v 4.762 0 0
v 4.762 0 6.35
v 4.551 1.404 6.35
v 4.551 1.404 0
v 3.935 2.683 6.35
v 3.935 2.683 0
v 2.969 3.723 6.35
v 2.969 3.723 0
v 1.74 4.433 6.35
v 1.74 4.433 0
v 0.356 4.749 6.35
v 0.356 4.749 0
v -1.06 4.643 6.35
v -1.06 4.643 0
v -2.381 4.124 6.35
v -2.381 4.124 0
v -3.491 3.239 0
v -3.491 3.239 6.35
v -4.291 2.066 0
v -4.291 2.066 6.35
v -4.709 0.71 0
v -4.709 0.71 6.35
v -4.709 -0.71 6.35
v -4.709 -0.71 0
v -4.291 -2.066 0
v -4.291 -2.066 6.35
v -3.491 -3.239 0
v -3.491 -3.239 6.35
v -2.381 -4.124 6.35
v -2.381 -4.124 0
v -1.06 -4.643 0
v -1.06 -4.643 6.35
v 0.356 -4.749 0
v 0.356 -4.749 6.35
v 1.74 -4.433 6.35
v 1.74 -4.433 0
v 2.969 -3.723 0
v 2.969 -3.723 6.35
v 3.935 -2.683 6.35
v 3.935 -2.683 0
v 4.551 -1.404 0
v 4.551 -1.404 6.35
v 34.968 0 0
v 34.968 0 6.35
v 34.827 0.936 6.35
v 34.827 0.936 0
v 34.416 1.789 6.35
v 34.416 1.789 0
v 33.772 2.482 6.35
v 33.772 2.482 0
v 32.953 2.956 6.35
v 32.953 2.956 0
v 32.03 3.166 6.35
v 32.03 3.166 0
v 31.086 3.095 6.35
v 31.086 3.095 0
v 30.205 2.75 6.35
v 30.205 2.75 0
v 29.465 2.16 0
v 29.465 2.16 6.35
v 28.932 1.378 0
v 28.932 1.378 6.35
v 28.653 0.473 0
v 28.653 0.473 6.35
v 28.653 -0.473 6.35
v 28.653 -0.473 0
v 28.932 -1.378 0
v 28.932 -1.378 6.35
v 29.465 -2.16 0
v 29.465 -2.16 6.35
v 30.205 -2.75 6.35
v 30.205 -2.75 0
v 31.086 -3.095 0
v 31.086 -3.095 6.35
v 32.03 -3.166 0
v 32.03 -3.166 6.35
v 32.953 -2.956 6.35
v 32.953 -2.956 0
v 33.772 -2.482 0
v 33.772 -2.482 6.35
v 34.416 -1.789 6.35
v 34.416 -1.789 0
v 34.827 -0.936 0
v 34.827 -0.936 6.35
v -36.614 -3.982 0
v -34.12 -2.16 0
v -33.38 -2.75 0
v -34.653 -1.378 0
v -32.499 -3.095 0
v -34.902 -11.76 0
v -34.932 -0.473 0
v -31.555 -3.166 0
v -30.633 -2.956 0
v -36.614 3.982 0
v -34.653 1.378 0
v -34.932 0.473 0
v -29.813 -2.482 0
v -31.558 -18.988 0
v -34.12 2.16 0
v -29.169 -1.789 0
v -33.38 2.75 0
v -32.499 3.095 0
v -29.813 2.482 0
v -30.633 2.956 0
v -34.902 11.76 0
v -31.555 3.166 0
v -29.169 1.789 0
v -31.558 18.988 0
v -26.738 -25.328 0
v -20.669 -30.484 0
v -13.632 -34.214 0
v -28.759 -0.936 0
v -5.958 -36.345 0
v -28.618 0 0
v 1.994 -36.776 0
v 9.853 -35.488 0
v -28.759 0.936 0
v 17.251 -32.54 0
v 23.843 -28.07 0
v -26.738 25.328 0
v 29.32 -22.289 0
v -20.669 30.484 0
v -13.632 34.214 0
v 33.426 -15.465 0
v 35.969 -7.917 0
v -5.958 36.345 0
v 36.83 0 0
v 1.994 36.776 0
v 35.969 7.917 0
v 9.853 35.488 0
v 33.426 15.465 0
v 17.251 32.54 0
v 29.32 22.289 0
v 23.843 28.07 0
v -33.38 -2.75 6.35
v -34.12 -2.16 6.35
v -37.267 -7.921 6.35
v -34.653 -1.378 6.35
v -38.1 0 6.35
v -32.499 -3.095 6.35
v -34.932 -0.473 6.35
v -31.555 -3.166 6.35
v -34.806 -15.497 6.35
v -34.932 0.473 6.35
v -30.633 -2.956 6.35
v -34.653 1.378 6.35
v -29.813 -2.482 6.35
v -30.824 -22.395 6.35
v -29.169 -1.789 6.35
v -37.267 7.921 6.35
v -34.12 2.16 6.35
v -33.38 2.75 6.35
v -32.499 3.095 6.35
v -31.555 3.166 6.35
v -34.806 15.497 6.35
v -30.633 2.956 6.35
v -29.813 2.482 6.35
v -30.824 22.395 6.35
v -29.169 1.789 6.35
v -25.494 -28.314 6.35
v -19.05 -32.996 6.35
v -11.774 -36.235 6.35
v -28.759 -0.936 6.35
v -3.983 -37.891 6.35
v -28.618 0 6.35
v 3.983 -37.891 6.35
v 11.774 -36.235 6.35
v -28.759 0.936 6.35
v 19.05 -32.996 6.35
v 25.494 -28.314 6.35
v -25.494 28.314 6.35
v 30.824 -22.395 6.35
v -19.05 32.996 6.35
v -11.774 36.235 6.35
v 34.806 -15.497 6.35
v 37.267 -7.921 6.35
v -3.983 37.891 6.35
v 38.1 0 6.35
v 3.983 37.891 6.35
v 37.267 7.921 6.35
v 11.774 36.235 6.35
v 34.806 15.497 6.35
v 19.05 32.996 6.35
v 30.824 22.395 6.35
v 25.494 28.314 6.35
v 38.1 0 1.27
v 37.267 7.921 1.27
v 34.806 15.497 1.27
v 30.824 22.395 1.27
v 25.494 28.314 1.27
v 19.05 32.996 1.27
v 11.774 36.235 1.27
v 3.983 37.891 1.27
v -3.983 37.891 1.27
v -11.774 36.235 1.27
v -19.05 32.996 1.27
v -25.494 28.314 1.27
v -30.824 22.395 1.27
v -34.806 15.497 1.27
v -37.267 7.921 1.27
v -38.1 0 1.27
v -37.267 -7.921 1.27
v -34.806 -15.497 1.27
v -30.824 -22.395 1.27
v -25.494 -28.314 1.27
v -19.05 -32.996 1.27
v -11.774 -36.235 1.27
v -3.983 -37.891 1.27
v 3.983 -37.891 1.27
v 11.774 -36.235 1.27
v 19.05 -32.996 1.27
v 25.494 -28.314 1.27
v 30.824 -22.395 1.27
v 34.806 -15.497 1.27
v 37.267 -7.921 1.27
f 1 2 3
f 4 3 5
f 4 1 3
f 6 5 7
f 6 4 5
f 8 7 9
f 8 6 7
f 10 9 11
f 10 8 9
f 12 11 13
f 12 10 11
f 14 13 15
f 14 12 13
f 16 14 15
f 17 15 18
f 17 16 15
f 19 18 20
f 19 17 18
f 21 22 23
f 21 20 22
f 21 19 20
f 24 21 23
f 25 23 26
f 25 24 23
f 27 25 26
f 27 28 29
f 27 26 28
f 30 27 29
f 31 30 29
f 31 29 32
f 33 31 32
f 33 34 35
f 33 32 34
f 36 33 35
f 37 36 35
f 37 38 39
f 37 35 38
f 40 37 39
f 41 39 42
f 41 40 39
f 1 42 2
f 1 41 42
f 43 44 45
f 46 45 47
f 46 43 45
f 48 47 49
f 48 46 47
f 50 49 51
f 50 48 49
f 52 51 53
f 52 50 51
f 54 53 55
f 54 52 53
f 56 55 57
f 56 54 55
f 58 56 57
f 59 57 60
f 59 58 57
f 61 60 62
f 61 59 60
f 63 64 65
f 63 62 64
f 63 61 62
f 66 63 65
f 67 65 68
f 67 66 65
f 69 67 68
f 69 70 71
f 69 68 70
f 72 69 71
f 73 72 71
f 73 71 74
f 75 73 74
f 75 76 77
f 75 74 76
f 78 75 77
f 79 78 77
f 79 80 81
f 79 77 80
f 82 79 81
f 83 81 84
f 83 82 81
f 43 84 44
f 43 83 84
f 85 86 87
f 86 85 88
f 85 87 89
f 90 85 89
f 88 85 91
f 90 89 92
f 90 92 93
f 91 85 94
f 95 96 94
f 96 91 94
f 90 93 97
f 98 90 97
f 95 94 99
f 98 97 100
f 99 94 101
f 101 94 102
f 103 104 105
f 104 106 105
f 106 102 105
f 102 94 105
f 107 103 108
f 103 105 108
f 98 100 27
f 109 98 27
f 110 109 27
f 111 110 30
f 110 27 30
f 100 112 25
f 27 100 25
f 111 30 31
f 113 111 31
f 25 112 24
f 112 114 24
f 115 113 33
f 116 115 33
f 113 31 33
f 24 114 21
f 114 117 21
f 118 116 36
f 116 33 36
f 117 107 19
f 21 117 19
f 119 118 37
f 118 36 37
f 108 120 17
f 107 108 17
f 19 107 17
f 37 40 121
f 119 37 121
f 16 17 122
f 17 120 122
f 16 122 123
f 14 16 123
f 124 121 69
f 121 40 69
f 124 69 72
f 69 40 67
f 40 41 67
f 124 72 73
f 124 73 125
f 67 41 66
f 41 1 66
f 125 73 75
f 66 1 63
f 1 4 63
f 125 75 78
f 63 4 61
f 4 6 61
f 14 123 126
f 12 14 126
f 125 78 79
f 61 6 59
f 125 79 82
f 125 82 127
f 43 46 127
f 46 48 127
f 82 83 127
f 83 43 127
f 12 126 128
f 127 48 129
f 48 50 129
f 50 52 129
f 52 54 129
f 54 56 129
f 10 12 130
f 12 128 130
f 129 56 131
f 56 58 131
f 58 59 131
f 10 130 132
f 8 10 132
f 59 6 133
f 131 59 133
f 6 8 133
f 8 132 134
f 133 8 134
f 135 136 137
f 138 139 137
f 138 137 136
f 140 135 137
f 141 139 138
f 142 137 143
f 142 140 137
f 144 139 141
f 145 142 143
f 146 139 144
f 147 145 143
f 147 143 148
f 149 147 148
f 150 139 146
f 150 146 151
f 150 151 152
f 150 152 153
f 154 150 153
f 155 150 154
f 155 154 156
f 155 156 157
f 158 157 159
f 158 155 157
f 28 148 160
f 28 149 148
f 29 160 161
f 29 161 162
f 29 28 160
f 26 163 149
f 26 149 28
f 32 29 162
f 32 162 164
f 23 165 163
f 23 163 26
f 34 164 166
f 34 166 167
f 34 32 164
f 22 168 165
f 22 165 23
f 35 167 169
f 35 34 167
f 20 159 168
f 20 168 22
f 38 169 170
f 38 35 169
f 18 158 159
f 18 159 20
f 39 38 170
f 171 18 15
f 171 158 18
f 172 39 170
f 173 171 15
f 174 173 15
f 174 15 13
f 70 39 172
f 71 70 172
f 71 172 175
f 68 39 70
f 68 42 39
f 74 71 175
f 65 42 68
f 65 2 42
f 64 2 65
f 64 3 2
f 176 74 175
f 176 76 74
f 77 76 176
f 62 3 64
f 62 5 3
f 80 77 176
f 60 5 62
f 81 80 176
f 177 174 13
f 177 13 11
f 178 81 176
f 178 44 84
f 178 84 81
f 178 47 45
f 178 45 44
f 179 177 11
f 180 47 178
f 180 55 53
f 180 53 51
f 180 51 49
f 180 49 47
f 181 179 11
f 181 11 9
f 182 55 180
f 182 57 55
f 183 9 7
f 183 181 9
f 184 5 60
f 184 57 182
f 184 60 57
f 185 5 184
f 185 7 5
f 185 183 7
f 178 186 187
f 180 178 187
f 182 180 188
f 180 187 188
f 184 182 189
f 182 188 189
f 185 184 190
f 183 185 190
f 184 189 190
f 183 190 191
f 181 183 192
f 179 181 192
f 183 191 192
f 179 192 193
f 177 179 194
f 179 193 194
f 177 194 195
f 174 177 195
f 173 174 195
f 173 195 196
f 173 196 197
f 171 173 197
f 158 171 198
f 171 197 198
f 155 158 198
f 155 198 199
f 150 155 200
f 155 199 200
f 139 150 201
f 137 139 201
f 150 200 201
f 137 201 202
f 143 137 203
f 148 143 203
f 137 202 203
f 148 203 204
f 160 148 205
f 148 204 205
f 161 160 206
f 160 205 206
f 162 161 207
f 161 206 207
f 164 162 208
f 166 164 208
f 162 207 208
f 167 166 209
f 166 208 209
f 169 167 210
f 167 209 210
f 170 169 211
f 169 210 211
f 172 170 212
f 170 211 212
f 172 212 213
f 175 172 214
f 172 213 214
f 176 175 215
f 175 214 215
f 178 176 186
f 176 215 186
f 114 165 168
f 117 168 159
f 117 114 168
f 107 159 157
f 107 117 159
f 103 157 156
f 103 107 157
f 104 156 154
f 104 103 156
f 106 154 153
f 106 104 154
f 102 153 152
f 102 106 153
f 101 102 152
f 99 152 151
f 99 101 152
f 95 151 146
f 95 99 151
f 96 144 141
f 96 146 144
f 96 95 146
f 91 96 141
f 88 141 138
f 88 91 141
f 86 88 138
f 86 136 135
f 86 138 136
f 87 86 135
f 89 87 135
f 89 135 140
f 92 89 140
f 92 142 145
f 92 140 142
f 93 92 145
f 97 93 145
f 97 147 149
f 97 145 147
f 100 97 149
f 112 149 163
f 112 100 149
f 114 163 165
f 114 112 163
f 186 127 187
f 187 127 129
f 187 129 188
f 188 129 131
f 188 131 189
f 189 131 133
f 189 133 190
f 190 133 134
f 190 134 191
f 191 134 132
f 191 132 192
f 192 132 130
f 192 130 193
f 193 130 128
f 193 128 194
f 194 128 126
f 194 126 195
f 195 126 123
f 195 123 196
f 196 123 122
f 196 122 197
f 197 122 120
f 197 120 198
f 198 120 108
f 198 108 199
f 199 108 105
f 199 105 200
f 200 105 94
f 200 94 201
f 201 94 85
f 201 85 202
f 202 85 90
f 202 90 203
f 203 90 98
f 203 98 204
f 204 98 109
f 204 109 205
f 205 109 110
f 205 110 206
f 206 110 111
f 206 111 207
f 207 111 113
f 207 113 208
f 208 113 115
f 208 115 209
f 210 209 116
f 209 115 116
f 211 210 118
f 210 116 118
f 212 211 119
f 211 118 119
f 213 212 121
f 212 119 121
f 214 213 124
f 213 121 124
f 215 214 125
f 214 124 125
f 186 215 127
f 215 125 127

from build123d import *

# Parameters (mm, degrees)
F0_R     = 38.1
F1_DEPTH = 6.35
F2_R     = 3.175
F2_R_2   = 4.7625
F3_DEPTH = 25.4
F4_SIZE  = 1.27


# Not quite as in the source:
# - a length typed as a fraction of an inch, garbled in the dataset ("3 / 203.2 mm" for 3/8 in), is restored


with BuildPart() as f1:
    # F0 (on Top) → F1 (new body)
    with BuildSketch(Plane.XY):
        Circle(F0_R)
    extrude(amount=F1_DEPTH)

    # F2 (on Top) → F3 (cut)
    with BuildSketch(Plane.XY):
        with Locations((-31.7926891148, 0)):
            Circle(F2_R)
        with Locations((31.7926891148, 0)):
            Circle(F2_R)
        Circle(F2_R_2)
    extrude(amount=F3_DEPTH, mode=Mode.SUBTRACT)

    # F4
    f4_edges = [f1.edges().sort_by_distance(p)[0] for p in [
        (-38.1, 0, 0),
    ]]
    chamfer(f4_edges, length=F4_SIZE)


solid = f1.part
